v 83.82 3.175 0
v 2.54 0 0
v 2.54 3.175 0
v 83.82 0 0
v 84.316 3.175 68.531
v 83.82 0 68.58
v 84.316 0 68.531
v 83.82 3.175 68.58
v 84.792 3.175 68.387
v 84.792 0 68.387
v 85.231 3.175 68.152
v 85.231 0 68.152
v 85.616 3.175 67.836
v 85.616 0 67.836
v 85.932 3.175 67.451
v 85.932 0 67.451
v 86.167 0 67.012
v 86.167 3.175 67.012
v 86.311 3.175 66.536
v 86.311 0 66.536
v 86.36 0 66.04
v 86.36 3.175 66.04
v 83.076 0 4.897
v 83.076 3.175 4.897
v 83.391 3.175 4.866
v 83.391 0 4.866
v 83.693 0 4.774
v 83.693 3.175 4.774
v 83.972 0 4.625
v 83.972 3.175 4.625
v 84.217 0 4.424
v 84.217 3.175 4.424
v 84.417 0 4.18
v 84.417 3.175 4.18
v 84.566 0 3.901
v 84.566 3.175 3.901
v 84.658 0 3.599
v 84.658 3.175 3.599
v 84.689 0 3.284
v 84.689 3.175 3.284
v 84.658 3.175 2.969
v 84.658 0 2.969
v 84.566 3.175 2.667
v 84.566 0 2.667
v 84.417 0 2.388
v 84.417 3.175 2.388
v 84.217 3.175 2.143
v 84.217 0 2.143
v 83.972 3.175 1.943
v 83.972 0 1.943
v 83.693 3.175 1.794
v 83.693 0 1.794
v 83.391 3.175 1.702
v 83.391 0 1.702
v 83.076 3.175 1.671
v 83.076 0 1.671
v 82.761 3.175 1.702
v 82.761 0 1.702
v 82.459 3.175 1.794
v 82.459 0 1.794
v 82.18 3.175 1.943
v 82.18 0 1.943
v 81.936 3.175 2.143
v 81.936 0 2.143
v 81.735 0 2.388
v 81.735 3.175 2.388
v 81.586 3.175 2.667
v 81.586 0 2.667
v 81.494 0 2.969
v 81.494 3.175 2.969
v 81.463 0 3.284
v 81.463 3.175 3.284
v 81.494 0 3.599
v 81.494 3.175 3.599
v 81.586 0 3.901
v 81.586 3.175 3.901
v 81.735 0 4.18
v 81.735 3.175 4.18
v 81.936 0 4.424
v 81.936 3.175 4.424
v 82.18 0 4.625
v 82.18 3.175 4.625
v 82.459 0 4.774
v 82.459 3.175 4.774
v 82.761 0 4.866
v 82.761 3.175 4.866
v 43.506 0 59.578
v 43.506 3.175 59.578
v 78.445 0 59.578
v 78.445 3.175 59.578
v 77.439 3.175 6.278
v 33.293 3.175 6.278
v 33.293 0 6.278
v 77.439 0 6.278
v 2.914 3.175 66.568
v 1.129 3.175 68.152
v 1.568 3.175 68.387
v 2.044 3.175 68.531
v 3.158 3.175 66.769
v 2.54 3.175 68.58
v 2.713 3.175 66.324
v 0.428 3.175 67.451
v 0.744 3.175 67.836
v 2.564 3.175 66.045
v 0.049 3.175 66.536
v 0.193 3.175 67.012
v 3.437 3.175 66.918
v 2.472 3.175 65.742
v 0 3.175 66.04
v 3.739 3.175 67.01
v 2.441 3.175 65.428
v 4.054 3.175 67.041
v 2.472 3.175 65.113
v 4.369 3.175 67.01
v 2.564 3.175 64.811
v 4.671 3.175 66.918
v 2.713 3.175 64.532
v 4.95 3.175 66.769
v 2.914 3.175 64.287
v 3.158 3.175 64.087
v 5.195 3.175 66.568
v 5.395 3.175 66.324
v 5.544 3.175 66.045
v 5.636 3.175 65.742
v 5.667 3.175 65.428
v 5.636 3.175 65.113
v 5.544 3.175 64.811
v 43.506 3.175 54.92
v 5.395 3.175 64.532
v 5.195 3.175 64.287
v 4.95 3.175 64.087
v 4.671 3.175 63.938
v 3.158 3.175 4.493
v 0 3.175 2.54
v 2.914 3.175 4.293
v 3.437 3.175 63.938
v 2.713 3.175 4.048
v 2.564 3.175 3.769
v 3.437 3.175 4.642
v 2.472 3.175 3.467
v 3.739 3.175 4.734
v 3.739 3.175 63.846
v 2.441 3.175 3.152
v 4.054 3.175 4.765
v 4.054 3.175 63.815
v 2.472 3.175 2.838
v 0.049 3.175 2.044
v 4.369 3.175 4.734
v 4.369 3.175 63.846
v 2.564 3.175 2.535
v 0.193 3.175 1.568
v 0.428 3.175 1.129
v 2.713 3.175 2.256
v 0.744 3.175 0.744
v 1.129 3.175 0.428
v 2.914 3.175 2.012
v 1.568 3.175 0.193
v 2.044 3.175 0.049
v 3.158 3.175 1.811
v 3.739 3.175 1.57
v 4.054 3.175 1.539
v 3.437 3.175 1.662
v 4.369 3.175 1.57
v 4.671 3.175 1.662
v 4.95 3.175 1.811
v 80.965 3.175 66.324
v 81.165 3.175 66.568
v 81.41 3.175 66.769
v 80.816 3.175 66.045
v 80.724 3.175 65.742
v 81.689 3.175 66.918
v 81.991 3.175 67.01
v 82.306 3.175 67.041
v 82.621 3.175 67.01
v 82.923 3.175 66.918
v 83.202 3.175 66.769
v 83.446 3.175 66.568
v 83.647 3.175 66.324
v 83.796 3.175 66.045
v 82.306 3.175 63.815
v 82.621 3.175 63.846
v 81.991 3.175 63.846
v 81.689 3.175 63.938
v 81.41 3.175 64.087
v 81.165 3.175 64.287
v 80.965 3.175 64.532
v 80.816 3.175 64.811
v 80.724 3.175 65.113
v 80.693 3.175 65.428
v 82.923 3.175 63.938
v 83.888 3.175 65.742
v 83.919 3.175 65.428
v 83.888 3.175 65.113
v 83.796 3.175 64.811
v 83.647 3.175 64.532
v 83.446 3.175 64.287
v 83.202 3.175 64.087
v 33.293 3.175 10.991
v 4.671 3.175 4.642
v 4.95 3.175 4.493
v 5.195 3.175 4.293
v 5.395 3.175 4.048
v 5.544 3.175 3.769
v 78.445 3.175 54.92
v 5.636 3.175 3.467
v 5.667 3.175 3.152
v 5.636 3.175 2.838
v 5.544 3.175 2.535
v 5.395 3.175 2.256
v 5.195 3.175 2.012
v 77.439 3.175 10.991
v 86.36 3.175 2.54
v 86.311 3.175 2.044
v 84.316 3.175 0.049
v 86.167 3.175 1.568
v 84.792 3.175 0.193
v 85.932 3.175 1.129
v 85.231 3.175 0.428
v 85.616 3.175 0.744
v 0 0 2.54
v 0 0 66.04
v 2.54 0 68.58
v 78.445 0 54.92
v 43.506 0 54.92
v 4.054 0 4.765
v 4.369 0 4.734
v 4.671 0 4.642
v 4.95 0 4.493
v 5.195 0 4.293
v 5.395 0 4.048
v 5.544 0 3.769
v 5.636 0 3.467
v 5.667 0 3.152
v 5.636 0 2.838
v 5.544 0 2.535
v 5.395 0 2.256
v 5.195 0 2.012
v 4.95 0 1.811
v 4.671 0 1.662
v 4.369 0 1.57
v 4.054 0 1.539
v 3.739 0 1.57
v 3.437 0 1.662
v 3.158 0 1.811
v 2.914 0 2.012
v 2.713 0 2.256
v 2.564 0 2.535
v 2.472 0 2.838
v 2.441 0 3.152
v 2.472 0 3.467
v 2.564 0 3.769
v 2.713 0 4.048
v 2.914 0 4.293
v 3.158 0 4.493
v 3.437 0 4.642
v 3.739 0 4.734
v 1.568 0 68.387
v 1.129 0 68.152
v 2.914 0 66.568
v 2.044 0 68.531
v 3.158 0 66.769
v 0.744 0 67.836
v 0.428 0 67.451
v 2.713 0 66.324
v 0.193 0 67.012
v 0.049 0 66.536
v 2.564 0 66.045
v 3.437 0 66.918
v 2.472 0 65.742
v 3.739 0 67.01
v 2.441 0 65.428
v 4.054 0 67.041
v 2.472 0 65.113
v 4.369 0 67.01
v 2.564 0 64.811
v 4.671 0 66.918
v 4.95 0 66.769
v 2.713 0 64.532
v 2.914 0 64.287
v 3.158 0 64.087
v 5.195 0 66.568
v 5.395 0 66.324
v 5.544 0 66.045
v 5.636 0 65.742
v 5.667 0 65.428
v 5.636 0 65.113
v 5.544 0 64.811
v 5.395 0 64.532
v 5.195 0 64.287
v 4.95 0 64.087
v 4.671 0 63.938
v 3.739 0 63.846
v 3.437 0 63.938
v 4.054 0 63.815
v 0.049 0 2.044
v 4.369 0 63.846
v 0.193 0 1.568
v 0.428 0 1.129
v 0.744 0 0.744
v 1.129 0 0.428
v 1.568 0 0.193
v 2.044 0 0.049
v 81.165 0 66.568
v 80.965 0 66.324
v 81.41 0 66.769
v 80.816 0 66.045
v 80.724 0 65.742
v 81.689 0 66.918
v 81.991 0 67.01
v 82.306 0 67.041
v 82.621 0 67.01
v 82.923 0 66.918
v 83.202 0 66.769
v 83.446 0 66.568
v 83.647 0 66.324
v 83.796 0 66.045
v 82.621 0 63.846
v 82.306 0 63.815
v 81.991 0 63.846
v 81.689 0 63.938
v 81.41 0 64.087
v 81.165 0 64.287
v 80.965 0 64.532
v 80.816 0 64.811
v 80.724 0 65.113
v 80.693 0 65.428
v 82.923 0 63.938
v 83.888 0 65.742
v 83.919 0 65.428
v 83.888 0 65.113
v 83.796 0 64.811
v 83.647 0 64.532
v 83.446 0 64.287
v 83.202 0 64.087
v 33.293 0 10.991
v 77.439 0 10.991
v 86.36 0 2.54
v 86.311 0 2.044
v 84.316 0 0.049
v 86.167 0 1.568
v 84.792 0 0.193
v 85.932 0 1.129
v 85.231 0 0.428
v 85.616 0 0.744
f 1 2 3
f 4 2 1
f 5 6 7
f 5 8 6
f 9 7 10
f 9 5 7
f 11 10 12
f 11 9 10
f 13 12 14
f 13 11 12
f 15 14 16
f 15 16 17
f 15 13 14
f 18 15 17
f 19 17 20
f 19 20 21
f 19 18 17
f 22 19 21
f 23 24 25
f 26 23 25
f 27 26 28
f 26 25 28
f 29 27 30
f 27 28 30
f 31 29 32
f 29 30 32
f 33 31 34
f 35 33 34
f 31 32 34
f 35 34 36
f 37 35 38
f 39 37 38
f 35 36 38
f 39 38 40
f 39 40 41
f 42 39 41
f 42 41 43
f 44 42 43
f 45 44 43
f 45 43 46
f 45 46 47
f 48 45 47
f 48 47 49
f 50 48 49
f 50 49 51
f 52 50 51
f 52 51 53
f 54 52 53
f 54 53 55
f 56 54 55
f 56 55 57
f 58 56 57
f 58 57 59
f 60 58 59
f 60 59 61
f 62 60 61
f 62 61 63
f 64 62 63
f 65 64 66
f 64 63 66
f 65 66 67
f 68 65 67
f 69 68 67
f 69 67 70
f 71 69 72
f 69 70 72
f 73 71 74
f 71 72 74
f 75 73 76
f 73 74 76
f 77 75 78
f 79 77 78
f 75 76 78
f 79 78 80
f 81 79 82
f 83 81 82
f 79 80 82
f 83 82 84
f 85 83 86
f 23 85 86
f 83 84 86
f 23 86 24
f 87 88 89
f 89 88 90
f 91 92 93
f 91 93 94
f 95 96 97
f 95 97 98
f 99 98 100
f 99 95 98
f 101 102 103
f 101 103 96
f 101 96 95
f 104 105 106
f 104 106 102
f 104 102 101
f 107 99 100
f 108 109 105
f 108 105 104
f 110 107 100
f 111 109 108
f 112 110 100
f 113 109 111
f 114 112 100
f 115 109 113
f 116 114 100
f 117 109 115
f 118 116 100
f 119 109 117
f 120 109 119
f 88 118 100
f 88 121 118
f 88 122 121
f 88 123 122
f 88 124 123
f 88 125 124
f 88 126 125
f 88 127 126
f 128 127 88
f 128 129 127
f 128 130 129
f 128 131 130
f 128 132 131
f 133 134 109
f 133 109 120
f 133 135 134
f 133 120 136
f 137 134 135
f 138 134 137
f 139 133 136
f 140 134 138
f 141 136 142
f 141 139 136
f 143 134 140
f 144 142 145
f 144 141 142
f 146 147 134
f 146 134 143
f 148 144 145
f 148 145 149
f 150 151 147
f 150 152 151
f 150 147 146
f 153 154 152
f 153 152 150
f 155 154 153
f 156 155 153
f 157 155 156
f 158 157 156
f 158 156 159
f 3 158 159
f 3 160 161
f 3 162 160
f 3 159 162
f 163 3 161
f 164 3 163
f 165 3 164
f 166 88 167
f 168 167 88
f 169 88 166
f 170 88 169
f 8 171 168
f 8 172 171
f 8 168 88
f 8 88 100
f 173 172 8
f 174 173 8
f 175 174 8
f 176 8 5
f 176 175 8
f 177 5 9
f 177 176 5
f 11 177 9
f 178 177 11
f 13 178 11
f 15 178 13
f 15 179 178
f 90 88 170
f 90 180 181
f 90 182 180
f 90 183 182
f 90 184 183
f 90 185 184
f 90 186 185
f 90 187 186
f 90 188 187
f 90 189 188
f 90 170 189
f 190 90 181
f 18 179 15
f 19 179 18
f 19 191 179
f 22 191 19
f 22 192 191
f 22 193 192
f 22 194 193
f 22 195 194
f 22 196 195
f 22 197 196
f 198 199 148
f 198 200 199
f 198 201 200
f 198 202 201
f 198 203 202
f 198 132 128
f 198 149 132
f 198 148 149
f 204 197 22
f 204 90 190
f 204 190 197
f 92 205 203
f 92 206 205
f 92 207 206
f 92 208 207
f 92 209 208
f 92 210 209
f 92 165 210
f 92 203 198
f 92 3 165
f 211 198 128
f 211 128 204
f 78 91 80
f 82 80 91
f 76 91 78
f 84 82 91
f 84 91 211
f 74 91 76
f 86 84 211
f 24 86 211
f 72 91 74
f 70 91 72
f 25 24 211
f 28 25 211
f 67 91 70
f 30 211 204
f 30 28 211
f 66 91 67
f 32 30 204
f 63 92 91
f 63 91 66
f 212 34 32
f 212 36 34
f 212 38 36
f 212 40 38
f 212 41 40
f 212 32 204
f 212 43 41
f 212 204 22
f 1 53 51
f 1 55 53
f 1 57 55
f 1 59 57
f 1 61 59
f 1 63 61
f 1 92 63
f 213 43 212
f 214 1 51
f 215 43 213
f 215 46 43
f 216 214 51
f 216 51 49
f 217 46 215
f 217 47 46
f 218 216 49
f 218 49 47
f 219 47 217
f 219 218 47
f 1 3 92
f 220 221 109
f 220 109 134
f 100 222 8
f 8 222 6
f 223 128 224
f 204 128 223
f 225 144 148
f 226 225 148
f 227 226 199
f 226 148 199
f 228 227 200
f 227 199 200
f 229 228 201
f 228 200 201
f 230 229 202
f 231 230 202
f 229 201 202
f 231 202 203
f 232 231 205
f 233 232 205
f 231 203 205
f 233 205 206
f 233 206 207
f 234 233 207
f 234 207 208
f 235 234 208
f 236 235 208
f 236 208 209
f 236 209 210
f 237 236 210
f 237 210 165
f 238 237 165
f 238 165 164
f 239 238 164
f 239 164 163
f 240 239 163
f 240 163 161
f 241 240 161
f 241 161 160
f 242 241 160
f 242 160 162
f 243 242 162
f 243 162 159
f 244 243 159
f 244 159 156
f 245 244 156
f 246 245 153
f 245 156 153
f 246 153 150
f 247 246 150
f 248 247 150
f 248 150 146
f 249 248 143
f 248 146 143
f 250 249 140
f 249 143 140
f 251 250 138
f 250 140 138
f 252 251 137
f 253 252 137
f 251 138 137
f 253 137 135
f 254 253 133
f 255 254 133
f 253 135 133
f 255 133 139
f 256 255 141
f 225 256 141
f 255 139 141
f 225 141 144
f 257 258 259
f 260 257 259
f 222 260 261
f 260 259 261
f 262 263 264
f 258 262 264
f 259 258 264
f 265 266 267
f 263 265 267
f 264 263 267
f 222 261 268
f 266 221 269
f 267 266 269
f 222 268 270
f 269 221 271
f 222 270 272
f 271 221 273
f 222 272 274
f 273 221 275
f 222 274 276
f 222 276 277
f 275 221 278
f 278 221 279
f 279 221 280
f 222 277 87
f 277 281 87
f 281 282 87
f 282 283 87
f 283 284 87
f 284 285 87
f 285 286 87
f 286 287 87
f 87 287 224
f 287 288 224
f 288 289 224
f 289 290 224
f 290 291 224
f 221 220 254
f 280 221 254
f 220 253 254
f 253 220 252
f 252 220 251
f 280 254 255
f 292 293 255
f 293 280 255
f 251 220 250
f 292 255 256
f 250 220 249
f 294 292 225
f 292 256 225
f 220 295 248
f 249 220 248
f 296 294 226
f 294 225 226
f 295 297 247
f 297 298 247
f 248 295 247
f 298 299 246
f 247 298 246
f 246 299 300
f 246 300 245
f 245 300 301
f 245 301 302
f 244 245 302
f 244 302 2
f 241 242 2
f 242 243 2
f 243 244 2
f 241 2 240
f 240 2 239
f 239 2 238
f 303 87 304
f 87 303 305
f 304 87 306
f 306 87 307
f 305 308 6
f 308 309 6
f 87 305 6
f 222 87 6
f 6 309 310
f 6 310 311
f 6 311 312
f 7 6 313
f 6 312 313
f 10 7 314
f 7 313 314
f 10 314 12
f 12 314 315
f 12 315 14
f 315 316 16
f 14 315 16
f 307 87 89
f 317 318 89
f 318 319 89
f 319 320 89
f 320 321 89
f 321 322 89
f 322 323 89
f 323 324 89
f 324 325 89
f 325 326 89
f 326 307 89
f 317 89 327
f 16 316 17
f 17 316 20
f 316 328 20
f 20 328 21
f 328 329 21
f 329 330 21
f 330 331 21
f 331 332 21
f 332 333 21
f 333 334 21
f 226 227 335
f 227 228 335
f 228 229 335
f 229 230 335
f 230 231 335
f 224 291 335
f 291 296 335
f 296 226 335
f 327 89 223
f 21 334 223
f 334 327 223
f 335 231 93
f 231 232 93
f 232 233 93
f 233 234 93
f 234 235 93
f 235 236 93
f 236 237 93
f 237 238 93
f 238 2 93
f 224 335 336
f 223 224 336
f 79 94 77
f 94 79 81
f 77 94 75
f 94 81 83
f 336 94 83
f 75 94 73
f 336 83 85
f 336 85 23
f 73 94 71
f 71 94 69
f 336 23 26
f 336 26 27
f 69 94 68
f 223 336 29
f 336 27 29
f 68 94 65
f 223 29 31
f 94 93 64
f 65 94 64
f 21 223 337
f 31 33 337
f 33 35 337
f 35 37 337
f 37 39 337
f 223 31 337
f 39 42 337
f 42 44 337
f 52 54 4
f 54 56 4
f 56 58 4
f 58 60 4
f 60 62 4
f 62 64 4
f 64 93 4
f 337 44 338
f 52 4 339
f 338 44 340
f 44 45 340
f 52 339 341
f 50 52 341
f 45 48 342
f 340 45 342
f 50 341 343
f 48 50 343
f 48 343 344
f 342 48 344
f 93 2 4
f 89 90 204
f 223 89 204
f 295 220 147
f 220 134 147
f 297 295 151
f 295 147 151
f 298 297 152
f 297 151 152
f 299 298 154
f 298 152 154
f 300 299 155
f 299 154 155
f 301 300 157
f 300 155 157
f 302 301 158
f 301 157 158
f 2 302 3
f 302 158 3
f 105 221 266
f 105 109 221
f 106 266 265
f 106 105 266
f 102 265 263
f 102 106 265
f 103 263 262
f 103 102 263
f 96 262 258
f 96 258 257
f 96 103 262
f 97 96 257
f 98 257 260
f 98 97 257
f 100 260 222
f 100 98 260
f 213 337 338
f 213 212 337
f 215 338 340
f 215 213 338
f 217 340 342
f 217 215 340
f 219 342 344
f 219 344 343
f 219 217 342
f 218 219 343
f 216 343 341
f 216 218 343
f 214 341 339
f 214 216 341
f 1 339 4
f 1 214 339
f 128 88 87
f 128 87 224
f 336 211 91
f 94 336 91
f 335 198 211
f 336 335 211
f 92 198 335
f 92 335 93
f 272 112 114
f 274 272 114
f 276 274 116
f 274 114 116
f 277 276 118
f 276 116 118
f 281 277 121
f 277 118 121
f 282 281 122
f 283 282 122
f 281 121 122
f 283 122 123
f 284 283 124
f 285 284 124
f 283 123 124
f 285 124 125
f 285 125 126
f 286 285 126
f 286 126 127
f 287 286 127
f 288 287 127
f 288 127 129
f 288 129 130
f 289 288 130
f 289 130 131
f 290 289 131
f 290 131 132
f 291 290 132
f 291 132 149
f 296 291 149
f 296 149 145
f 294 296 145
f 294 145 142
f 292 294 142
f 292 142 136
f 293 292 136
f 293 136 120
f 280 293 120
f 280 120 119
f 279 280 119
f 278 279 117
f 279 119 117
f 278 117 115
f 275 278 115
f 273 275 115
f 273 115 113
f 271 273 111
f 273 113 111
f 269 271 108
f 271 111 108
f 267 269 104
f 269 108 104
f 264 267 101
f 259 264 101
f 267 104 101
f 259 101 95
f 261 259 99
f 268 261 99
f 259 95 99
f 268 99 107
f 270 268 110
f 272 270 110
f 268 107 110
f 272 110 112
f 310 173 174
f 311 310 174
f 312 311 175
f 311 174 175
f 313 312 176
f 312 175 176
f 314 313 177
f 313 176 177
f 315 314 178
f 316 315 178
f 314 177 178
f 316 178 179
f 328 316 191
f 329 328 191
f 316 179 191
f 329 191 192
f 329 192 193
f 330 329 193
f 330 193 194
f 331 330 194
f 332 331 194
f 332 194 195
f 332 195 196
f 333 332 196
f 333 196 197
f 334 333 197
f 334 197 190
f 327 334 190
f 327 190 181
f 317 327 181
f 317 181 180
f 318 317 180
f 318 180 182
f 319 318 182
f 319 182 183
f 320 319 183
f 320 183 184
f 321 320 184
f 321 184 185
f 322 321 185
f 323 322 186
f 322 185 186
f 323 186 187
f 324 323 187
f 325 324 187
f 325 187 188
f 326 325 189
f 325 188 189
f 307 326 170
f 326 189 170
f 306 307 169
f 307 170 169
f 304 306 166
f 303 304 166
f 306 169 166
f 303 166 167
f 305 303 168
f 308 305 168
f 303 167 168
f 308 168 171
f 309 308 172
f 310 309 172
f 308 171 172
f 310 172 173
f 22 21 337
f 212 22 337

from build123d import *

# Parameters (mm, degrees)
SKETCH1_W           = 86.36
SKETCH1_H           = 68.58
BOSS_EXTRUDE1_DEPTH = 3.175
FILLET1_R           = 2.54
SKETCH2_R           = 1.6129
CUT_EXTRUDE1_DEPTH  = 4.175
SKETCH3_W           = 44.145937315
SKETCH3_H           = 4.712813079
SKETCH3_W_2         = 34.939039867
SKETCH3_H_2         = 4.658410012
CUT_EXTRUDE2_DEPTH  = 4.175


with BuildPart() as part:
    # Sketch1 → Boss-Extrude1 (new body)
    with BuildSketch(Plane(origin=(0, 0, 0), x_dir=(1, 0, 0), z_dir=(0, 1, 0))):
        with Locations((43.18, -34.29)):
            Rectangle(SKETCH1_W, SKETCH1_H)
    extrude(amount=BOSS_EXTRUDE1_DEPTH)

    # Fillet1
    fillet1_edges = [part.edges().sort_by_distance(p)[0] for p in [
        (0, 1.5875, 0),
        (86.36, 1.5875, 0),
        (86.36, 1.5875, 68.58),
        (0, 1.5875, 68.58),
    ]]
    fillet(fillet1_edges, radius=FILLET1_R)

    # Sketch2 → Cut-Extrude1 (cut, through all)
    with BuildSketch(Plane(origin=(0, 3.175, 0), x_dir=(-1, 0, 0), z_dir=(0, 1, 0))):
        with Locations(Location((-4.054045308, 3.152222292, 0), (0, 0, 90))):  # turned: the seam where the file's is
            Circle(SKETCH2_R)
        with Locations(Location((-83.076051224, 3.283948776, 0), (0, 0, 90))):  # turned: the seam where the file's is
            Circle(SKETCH2_R)
        with Locations(Location((-82.305954692, 65.427777708, 0), (0, 0, 90))):  # turned: the seam where the file's is
            Circle(SKETCH2_R)
        with Locations(Location((-4.054045308, 65.427777708, 0), (0, 0, 90))):  # turned: the seam where the file's is
            Circle(SKETCH2_R)
    extrude(amount=-CUT_EXTRUDE1_DEPTH, mode=Mode.SUBTRACT)

    # Sketch3 → Cut-Extrude2 (cut, through all)
    with BuildSketch(Plane(origin=(0, 3.175, 0), x_dir=(1, 0, 0), z_dir=(0, 1, 0))):
        with Locations((55.366118113, -8.634348767)):
            Rectangle(SKETCH3_W, SKETCH3_H)
        with Locations((60.97547331, -57.248737221)):
            Rectangle(SKETCH3_W_2, SKETCH3_H_2)
    extrude(amount=-CUT_EXTRUDE2_DEPTH, mode=Mode.SUBTRACT)


solid = part.part
